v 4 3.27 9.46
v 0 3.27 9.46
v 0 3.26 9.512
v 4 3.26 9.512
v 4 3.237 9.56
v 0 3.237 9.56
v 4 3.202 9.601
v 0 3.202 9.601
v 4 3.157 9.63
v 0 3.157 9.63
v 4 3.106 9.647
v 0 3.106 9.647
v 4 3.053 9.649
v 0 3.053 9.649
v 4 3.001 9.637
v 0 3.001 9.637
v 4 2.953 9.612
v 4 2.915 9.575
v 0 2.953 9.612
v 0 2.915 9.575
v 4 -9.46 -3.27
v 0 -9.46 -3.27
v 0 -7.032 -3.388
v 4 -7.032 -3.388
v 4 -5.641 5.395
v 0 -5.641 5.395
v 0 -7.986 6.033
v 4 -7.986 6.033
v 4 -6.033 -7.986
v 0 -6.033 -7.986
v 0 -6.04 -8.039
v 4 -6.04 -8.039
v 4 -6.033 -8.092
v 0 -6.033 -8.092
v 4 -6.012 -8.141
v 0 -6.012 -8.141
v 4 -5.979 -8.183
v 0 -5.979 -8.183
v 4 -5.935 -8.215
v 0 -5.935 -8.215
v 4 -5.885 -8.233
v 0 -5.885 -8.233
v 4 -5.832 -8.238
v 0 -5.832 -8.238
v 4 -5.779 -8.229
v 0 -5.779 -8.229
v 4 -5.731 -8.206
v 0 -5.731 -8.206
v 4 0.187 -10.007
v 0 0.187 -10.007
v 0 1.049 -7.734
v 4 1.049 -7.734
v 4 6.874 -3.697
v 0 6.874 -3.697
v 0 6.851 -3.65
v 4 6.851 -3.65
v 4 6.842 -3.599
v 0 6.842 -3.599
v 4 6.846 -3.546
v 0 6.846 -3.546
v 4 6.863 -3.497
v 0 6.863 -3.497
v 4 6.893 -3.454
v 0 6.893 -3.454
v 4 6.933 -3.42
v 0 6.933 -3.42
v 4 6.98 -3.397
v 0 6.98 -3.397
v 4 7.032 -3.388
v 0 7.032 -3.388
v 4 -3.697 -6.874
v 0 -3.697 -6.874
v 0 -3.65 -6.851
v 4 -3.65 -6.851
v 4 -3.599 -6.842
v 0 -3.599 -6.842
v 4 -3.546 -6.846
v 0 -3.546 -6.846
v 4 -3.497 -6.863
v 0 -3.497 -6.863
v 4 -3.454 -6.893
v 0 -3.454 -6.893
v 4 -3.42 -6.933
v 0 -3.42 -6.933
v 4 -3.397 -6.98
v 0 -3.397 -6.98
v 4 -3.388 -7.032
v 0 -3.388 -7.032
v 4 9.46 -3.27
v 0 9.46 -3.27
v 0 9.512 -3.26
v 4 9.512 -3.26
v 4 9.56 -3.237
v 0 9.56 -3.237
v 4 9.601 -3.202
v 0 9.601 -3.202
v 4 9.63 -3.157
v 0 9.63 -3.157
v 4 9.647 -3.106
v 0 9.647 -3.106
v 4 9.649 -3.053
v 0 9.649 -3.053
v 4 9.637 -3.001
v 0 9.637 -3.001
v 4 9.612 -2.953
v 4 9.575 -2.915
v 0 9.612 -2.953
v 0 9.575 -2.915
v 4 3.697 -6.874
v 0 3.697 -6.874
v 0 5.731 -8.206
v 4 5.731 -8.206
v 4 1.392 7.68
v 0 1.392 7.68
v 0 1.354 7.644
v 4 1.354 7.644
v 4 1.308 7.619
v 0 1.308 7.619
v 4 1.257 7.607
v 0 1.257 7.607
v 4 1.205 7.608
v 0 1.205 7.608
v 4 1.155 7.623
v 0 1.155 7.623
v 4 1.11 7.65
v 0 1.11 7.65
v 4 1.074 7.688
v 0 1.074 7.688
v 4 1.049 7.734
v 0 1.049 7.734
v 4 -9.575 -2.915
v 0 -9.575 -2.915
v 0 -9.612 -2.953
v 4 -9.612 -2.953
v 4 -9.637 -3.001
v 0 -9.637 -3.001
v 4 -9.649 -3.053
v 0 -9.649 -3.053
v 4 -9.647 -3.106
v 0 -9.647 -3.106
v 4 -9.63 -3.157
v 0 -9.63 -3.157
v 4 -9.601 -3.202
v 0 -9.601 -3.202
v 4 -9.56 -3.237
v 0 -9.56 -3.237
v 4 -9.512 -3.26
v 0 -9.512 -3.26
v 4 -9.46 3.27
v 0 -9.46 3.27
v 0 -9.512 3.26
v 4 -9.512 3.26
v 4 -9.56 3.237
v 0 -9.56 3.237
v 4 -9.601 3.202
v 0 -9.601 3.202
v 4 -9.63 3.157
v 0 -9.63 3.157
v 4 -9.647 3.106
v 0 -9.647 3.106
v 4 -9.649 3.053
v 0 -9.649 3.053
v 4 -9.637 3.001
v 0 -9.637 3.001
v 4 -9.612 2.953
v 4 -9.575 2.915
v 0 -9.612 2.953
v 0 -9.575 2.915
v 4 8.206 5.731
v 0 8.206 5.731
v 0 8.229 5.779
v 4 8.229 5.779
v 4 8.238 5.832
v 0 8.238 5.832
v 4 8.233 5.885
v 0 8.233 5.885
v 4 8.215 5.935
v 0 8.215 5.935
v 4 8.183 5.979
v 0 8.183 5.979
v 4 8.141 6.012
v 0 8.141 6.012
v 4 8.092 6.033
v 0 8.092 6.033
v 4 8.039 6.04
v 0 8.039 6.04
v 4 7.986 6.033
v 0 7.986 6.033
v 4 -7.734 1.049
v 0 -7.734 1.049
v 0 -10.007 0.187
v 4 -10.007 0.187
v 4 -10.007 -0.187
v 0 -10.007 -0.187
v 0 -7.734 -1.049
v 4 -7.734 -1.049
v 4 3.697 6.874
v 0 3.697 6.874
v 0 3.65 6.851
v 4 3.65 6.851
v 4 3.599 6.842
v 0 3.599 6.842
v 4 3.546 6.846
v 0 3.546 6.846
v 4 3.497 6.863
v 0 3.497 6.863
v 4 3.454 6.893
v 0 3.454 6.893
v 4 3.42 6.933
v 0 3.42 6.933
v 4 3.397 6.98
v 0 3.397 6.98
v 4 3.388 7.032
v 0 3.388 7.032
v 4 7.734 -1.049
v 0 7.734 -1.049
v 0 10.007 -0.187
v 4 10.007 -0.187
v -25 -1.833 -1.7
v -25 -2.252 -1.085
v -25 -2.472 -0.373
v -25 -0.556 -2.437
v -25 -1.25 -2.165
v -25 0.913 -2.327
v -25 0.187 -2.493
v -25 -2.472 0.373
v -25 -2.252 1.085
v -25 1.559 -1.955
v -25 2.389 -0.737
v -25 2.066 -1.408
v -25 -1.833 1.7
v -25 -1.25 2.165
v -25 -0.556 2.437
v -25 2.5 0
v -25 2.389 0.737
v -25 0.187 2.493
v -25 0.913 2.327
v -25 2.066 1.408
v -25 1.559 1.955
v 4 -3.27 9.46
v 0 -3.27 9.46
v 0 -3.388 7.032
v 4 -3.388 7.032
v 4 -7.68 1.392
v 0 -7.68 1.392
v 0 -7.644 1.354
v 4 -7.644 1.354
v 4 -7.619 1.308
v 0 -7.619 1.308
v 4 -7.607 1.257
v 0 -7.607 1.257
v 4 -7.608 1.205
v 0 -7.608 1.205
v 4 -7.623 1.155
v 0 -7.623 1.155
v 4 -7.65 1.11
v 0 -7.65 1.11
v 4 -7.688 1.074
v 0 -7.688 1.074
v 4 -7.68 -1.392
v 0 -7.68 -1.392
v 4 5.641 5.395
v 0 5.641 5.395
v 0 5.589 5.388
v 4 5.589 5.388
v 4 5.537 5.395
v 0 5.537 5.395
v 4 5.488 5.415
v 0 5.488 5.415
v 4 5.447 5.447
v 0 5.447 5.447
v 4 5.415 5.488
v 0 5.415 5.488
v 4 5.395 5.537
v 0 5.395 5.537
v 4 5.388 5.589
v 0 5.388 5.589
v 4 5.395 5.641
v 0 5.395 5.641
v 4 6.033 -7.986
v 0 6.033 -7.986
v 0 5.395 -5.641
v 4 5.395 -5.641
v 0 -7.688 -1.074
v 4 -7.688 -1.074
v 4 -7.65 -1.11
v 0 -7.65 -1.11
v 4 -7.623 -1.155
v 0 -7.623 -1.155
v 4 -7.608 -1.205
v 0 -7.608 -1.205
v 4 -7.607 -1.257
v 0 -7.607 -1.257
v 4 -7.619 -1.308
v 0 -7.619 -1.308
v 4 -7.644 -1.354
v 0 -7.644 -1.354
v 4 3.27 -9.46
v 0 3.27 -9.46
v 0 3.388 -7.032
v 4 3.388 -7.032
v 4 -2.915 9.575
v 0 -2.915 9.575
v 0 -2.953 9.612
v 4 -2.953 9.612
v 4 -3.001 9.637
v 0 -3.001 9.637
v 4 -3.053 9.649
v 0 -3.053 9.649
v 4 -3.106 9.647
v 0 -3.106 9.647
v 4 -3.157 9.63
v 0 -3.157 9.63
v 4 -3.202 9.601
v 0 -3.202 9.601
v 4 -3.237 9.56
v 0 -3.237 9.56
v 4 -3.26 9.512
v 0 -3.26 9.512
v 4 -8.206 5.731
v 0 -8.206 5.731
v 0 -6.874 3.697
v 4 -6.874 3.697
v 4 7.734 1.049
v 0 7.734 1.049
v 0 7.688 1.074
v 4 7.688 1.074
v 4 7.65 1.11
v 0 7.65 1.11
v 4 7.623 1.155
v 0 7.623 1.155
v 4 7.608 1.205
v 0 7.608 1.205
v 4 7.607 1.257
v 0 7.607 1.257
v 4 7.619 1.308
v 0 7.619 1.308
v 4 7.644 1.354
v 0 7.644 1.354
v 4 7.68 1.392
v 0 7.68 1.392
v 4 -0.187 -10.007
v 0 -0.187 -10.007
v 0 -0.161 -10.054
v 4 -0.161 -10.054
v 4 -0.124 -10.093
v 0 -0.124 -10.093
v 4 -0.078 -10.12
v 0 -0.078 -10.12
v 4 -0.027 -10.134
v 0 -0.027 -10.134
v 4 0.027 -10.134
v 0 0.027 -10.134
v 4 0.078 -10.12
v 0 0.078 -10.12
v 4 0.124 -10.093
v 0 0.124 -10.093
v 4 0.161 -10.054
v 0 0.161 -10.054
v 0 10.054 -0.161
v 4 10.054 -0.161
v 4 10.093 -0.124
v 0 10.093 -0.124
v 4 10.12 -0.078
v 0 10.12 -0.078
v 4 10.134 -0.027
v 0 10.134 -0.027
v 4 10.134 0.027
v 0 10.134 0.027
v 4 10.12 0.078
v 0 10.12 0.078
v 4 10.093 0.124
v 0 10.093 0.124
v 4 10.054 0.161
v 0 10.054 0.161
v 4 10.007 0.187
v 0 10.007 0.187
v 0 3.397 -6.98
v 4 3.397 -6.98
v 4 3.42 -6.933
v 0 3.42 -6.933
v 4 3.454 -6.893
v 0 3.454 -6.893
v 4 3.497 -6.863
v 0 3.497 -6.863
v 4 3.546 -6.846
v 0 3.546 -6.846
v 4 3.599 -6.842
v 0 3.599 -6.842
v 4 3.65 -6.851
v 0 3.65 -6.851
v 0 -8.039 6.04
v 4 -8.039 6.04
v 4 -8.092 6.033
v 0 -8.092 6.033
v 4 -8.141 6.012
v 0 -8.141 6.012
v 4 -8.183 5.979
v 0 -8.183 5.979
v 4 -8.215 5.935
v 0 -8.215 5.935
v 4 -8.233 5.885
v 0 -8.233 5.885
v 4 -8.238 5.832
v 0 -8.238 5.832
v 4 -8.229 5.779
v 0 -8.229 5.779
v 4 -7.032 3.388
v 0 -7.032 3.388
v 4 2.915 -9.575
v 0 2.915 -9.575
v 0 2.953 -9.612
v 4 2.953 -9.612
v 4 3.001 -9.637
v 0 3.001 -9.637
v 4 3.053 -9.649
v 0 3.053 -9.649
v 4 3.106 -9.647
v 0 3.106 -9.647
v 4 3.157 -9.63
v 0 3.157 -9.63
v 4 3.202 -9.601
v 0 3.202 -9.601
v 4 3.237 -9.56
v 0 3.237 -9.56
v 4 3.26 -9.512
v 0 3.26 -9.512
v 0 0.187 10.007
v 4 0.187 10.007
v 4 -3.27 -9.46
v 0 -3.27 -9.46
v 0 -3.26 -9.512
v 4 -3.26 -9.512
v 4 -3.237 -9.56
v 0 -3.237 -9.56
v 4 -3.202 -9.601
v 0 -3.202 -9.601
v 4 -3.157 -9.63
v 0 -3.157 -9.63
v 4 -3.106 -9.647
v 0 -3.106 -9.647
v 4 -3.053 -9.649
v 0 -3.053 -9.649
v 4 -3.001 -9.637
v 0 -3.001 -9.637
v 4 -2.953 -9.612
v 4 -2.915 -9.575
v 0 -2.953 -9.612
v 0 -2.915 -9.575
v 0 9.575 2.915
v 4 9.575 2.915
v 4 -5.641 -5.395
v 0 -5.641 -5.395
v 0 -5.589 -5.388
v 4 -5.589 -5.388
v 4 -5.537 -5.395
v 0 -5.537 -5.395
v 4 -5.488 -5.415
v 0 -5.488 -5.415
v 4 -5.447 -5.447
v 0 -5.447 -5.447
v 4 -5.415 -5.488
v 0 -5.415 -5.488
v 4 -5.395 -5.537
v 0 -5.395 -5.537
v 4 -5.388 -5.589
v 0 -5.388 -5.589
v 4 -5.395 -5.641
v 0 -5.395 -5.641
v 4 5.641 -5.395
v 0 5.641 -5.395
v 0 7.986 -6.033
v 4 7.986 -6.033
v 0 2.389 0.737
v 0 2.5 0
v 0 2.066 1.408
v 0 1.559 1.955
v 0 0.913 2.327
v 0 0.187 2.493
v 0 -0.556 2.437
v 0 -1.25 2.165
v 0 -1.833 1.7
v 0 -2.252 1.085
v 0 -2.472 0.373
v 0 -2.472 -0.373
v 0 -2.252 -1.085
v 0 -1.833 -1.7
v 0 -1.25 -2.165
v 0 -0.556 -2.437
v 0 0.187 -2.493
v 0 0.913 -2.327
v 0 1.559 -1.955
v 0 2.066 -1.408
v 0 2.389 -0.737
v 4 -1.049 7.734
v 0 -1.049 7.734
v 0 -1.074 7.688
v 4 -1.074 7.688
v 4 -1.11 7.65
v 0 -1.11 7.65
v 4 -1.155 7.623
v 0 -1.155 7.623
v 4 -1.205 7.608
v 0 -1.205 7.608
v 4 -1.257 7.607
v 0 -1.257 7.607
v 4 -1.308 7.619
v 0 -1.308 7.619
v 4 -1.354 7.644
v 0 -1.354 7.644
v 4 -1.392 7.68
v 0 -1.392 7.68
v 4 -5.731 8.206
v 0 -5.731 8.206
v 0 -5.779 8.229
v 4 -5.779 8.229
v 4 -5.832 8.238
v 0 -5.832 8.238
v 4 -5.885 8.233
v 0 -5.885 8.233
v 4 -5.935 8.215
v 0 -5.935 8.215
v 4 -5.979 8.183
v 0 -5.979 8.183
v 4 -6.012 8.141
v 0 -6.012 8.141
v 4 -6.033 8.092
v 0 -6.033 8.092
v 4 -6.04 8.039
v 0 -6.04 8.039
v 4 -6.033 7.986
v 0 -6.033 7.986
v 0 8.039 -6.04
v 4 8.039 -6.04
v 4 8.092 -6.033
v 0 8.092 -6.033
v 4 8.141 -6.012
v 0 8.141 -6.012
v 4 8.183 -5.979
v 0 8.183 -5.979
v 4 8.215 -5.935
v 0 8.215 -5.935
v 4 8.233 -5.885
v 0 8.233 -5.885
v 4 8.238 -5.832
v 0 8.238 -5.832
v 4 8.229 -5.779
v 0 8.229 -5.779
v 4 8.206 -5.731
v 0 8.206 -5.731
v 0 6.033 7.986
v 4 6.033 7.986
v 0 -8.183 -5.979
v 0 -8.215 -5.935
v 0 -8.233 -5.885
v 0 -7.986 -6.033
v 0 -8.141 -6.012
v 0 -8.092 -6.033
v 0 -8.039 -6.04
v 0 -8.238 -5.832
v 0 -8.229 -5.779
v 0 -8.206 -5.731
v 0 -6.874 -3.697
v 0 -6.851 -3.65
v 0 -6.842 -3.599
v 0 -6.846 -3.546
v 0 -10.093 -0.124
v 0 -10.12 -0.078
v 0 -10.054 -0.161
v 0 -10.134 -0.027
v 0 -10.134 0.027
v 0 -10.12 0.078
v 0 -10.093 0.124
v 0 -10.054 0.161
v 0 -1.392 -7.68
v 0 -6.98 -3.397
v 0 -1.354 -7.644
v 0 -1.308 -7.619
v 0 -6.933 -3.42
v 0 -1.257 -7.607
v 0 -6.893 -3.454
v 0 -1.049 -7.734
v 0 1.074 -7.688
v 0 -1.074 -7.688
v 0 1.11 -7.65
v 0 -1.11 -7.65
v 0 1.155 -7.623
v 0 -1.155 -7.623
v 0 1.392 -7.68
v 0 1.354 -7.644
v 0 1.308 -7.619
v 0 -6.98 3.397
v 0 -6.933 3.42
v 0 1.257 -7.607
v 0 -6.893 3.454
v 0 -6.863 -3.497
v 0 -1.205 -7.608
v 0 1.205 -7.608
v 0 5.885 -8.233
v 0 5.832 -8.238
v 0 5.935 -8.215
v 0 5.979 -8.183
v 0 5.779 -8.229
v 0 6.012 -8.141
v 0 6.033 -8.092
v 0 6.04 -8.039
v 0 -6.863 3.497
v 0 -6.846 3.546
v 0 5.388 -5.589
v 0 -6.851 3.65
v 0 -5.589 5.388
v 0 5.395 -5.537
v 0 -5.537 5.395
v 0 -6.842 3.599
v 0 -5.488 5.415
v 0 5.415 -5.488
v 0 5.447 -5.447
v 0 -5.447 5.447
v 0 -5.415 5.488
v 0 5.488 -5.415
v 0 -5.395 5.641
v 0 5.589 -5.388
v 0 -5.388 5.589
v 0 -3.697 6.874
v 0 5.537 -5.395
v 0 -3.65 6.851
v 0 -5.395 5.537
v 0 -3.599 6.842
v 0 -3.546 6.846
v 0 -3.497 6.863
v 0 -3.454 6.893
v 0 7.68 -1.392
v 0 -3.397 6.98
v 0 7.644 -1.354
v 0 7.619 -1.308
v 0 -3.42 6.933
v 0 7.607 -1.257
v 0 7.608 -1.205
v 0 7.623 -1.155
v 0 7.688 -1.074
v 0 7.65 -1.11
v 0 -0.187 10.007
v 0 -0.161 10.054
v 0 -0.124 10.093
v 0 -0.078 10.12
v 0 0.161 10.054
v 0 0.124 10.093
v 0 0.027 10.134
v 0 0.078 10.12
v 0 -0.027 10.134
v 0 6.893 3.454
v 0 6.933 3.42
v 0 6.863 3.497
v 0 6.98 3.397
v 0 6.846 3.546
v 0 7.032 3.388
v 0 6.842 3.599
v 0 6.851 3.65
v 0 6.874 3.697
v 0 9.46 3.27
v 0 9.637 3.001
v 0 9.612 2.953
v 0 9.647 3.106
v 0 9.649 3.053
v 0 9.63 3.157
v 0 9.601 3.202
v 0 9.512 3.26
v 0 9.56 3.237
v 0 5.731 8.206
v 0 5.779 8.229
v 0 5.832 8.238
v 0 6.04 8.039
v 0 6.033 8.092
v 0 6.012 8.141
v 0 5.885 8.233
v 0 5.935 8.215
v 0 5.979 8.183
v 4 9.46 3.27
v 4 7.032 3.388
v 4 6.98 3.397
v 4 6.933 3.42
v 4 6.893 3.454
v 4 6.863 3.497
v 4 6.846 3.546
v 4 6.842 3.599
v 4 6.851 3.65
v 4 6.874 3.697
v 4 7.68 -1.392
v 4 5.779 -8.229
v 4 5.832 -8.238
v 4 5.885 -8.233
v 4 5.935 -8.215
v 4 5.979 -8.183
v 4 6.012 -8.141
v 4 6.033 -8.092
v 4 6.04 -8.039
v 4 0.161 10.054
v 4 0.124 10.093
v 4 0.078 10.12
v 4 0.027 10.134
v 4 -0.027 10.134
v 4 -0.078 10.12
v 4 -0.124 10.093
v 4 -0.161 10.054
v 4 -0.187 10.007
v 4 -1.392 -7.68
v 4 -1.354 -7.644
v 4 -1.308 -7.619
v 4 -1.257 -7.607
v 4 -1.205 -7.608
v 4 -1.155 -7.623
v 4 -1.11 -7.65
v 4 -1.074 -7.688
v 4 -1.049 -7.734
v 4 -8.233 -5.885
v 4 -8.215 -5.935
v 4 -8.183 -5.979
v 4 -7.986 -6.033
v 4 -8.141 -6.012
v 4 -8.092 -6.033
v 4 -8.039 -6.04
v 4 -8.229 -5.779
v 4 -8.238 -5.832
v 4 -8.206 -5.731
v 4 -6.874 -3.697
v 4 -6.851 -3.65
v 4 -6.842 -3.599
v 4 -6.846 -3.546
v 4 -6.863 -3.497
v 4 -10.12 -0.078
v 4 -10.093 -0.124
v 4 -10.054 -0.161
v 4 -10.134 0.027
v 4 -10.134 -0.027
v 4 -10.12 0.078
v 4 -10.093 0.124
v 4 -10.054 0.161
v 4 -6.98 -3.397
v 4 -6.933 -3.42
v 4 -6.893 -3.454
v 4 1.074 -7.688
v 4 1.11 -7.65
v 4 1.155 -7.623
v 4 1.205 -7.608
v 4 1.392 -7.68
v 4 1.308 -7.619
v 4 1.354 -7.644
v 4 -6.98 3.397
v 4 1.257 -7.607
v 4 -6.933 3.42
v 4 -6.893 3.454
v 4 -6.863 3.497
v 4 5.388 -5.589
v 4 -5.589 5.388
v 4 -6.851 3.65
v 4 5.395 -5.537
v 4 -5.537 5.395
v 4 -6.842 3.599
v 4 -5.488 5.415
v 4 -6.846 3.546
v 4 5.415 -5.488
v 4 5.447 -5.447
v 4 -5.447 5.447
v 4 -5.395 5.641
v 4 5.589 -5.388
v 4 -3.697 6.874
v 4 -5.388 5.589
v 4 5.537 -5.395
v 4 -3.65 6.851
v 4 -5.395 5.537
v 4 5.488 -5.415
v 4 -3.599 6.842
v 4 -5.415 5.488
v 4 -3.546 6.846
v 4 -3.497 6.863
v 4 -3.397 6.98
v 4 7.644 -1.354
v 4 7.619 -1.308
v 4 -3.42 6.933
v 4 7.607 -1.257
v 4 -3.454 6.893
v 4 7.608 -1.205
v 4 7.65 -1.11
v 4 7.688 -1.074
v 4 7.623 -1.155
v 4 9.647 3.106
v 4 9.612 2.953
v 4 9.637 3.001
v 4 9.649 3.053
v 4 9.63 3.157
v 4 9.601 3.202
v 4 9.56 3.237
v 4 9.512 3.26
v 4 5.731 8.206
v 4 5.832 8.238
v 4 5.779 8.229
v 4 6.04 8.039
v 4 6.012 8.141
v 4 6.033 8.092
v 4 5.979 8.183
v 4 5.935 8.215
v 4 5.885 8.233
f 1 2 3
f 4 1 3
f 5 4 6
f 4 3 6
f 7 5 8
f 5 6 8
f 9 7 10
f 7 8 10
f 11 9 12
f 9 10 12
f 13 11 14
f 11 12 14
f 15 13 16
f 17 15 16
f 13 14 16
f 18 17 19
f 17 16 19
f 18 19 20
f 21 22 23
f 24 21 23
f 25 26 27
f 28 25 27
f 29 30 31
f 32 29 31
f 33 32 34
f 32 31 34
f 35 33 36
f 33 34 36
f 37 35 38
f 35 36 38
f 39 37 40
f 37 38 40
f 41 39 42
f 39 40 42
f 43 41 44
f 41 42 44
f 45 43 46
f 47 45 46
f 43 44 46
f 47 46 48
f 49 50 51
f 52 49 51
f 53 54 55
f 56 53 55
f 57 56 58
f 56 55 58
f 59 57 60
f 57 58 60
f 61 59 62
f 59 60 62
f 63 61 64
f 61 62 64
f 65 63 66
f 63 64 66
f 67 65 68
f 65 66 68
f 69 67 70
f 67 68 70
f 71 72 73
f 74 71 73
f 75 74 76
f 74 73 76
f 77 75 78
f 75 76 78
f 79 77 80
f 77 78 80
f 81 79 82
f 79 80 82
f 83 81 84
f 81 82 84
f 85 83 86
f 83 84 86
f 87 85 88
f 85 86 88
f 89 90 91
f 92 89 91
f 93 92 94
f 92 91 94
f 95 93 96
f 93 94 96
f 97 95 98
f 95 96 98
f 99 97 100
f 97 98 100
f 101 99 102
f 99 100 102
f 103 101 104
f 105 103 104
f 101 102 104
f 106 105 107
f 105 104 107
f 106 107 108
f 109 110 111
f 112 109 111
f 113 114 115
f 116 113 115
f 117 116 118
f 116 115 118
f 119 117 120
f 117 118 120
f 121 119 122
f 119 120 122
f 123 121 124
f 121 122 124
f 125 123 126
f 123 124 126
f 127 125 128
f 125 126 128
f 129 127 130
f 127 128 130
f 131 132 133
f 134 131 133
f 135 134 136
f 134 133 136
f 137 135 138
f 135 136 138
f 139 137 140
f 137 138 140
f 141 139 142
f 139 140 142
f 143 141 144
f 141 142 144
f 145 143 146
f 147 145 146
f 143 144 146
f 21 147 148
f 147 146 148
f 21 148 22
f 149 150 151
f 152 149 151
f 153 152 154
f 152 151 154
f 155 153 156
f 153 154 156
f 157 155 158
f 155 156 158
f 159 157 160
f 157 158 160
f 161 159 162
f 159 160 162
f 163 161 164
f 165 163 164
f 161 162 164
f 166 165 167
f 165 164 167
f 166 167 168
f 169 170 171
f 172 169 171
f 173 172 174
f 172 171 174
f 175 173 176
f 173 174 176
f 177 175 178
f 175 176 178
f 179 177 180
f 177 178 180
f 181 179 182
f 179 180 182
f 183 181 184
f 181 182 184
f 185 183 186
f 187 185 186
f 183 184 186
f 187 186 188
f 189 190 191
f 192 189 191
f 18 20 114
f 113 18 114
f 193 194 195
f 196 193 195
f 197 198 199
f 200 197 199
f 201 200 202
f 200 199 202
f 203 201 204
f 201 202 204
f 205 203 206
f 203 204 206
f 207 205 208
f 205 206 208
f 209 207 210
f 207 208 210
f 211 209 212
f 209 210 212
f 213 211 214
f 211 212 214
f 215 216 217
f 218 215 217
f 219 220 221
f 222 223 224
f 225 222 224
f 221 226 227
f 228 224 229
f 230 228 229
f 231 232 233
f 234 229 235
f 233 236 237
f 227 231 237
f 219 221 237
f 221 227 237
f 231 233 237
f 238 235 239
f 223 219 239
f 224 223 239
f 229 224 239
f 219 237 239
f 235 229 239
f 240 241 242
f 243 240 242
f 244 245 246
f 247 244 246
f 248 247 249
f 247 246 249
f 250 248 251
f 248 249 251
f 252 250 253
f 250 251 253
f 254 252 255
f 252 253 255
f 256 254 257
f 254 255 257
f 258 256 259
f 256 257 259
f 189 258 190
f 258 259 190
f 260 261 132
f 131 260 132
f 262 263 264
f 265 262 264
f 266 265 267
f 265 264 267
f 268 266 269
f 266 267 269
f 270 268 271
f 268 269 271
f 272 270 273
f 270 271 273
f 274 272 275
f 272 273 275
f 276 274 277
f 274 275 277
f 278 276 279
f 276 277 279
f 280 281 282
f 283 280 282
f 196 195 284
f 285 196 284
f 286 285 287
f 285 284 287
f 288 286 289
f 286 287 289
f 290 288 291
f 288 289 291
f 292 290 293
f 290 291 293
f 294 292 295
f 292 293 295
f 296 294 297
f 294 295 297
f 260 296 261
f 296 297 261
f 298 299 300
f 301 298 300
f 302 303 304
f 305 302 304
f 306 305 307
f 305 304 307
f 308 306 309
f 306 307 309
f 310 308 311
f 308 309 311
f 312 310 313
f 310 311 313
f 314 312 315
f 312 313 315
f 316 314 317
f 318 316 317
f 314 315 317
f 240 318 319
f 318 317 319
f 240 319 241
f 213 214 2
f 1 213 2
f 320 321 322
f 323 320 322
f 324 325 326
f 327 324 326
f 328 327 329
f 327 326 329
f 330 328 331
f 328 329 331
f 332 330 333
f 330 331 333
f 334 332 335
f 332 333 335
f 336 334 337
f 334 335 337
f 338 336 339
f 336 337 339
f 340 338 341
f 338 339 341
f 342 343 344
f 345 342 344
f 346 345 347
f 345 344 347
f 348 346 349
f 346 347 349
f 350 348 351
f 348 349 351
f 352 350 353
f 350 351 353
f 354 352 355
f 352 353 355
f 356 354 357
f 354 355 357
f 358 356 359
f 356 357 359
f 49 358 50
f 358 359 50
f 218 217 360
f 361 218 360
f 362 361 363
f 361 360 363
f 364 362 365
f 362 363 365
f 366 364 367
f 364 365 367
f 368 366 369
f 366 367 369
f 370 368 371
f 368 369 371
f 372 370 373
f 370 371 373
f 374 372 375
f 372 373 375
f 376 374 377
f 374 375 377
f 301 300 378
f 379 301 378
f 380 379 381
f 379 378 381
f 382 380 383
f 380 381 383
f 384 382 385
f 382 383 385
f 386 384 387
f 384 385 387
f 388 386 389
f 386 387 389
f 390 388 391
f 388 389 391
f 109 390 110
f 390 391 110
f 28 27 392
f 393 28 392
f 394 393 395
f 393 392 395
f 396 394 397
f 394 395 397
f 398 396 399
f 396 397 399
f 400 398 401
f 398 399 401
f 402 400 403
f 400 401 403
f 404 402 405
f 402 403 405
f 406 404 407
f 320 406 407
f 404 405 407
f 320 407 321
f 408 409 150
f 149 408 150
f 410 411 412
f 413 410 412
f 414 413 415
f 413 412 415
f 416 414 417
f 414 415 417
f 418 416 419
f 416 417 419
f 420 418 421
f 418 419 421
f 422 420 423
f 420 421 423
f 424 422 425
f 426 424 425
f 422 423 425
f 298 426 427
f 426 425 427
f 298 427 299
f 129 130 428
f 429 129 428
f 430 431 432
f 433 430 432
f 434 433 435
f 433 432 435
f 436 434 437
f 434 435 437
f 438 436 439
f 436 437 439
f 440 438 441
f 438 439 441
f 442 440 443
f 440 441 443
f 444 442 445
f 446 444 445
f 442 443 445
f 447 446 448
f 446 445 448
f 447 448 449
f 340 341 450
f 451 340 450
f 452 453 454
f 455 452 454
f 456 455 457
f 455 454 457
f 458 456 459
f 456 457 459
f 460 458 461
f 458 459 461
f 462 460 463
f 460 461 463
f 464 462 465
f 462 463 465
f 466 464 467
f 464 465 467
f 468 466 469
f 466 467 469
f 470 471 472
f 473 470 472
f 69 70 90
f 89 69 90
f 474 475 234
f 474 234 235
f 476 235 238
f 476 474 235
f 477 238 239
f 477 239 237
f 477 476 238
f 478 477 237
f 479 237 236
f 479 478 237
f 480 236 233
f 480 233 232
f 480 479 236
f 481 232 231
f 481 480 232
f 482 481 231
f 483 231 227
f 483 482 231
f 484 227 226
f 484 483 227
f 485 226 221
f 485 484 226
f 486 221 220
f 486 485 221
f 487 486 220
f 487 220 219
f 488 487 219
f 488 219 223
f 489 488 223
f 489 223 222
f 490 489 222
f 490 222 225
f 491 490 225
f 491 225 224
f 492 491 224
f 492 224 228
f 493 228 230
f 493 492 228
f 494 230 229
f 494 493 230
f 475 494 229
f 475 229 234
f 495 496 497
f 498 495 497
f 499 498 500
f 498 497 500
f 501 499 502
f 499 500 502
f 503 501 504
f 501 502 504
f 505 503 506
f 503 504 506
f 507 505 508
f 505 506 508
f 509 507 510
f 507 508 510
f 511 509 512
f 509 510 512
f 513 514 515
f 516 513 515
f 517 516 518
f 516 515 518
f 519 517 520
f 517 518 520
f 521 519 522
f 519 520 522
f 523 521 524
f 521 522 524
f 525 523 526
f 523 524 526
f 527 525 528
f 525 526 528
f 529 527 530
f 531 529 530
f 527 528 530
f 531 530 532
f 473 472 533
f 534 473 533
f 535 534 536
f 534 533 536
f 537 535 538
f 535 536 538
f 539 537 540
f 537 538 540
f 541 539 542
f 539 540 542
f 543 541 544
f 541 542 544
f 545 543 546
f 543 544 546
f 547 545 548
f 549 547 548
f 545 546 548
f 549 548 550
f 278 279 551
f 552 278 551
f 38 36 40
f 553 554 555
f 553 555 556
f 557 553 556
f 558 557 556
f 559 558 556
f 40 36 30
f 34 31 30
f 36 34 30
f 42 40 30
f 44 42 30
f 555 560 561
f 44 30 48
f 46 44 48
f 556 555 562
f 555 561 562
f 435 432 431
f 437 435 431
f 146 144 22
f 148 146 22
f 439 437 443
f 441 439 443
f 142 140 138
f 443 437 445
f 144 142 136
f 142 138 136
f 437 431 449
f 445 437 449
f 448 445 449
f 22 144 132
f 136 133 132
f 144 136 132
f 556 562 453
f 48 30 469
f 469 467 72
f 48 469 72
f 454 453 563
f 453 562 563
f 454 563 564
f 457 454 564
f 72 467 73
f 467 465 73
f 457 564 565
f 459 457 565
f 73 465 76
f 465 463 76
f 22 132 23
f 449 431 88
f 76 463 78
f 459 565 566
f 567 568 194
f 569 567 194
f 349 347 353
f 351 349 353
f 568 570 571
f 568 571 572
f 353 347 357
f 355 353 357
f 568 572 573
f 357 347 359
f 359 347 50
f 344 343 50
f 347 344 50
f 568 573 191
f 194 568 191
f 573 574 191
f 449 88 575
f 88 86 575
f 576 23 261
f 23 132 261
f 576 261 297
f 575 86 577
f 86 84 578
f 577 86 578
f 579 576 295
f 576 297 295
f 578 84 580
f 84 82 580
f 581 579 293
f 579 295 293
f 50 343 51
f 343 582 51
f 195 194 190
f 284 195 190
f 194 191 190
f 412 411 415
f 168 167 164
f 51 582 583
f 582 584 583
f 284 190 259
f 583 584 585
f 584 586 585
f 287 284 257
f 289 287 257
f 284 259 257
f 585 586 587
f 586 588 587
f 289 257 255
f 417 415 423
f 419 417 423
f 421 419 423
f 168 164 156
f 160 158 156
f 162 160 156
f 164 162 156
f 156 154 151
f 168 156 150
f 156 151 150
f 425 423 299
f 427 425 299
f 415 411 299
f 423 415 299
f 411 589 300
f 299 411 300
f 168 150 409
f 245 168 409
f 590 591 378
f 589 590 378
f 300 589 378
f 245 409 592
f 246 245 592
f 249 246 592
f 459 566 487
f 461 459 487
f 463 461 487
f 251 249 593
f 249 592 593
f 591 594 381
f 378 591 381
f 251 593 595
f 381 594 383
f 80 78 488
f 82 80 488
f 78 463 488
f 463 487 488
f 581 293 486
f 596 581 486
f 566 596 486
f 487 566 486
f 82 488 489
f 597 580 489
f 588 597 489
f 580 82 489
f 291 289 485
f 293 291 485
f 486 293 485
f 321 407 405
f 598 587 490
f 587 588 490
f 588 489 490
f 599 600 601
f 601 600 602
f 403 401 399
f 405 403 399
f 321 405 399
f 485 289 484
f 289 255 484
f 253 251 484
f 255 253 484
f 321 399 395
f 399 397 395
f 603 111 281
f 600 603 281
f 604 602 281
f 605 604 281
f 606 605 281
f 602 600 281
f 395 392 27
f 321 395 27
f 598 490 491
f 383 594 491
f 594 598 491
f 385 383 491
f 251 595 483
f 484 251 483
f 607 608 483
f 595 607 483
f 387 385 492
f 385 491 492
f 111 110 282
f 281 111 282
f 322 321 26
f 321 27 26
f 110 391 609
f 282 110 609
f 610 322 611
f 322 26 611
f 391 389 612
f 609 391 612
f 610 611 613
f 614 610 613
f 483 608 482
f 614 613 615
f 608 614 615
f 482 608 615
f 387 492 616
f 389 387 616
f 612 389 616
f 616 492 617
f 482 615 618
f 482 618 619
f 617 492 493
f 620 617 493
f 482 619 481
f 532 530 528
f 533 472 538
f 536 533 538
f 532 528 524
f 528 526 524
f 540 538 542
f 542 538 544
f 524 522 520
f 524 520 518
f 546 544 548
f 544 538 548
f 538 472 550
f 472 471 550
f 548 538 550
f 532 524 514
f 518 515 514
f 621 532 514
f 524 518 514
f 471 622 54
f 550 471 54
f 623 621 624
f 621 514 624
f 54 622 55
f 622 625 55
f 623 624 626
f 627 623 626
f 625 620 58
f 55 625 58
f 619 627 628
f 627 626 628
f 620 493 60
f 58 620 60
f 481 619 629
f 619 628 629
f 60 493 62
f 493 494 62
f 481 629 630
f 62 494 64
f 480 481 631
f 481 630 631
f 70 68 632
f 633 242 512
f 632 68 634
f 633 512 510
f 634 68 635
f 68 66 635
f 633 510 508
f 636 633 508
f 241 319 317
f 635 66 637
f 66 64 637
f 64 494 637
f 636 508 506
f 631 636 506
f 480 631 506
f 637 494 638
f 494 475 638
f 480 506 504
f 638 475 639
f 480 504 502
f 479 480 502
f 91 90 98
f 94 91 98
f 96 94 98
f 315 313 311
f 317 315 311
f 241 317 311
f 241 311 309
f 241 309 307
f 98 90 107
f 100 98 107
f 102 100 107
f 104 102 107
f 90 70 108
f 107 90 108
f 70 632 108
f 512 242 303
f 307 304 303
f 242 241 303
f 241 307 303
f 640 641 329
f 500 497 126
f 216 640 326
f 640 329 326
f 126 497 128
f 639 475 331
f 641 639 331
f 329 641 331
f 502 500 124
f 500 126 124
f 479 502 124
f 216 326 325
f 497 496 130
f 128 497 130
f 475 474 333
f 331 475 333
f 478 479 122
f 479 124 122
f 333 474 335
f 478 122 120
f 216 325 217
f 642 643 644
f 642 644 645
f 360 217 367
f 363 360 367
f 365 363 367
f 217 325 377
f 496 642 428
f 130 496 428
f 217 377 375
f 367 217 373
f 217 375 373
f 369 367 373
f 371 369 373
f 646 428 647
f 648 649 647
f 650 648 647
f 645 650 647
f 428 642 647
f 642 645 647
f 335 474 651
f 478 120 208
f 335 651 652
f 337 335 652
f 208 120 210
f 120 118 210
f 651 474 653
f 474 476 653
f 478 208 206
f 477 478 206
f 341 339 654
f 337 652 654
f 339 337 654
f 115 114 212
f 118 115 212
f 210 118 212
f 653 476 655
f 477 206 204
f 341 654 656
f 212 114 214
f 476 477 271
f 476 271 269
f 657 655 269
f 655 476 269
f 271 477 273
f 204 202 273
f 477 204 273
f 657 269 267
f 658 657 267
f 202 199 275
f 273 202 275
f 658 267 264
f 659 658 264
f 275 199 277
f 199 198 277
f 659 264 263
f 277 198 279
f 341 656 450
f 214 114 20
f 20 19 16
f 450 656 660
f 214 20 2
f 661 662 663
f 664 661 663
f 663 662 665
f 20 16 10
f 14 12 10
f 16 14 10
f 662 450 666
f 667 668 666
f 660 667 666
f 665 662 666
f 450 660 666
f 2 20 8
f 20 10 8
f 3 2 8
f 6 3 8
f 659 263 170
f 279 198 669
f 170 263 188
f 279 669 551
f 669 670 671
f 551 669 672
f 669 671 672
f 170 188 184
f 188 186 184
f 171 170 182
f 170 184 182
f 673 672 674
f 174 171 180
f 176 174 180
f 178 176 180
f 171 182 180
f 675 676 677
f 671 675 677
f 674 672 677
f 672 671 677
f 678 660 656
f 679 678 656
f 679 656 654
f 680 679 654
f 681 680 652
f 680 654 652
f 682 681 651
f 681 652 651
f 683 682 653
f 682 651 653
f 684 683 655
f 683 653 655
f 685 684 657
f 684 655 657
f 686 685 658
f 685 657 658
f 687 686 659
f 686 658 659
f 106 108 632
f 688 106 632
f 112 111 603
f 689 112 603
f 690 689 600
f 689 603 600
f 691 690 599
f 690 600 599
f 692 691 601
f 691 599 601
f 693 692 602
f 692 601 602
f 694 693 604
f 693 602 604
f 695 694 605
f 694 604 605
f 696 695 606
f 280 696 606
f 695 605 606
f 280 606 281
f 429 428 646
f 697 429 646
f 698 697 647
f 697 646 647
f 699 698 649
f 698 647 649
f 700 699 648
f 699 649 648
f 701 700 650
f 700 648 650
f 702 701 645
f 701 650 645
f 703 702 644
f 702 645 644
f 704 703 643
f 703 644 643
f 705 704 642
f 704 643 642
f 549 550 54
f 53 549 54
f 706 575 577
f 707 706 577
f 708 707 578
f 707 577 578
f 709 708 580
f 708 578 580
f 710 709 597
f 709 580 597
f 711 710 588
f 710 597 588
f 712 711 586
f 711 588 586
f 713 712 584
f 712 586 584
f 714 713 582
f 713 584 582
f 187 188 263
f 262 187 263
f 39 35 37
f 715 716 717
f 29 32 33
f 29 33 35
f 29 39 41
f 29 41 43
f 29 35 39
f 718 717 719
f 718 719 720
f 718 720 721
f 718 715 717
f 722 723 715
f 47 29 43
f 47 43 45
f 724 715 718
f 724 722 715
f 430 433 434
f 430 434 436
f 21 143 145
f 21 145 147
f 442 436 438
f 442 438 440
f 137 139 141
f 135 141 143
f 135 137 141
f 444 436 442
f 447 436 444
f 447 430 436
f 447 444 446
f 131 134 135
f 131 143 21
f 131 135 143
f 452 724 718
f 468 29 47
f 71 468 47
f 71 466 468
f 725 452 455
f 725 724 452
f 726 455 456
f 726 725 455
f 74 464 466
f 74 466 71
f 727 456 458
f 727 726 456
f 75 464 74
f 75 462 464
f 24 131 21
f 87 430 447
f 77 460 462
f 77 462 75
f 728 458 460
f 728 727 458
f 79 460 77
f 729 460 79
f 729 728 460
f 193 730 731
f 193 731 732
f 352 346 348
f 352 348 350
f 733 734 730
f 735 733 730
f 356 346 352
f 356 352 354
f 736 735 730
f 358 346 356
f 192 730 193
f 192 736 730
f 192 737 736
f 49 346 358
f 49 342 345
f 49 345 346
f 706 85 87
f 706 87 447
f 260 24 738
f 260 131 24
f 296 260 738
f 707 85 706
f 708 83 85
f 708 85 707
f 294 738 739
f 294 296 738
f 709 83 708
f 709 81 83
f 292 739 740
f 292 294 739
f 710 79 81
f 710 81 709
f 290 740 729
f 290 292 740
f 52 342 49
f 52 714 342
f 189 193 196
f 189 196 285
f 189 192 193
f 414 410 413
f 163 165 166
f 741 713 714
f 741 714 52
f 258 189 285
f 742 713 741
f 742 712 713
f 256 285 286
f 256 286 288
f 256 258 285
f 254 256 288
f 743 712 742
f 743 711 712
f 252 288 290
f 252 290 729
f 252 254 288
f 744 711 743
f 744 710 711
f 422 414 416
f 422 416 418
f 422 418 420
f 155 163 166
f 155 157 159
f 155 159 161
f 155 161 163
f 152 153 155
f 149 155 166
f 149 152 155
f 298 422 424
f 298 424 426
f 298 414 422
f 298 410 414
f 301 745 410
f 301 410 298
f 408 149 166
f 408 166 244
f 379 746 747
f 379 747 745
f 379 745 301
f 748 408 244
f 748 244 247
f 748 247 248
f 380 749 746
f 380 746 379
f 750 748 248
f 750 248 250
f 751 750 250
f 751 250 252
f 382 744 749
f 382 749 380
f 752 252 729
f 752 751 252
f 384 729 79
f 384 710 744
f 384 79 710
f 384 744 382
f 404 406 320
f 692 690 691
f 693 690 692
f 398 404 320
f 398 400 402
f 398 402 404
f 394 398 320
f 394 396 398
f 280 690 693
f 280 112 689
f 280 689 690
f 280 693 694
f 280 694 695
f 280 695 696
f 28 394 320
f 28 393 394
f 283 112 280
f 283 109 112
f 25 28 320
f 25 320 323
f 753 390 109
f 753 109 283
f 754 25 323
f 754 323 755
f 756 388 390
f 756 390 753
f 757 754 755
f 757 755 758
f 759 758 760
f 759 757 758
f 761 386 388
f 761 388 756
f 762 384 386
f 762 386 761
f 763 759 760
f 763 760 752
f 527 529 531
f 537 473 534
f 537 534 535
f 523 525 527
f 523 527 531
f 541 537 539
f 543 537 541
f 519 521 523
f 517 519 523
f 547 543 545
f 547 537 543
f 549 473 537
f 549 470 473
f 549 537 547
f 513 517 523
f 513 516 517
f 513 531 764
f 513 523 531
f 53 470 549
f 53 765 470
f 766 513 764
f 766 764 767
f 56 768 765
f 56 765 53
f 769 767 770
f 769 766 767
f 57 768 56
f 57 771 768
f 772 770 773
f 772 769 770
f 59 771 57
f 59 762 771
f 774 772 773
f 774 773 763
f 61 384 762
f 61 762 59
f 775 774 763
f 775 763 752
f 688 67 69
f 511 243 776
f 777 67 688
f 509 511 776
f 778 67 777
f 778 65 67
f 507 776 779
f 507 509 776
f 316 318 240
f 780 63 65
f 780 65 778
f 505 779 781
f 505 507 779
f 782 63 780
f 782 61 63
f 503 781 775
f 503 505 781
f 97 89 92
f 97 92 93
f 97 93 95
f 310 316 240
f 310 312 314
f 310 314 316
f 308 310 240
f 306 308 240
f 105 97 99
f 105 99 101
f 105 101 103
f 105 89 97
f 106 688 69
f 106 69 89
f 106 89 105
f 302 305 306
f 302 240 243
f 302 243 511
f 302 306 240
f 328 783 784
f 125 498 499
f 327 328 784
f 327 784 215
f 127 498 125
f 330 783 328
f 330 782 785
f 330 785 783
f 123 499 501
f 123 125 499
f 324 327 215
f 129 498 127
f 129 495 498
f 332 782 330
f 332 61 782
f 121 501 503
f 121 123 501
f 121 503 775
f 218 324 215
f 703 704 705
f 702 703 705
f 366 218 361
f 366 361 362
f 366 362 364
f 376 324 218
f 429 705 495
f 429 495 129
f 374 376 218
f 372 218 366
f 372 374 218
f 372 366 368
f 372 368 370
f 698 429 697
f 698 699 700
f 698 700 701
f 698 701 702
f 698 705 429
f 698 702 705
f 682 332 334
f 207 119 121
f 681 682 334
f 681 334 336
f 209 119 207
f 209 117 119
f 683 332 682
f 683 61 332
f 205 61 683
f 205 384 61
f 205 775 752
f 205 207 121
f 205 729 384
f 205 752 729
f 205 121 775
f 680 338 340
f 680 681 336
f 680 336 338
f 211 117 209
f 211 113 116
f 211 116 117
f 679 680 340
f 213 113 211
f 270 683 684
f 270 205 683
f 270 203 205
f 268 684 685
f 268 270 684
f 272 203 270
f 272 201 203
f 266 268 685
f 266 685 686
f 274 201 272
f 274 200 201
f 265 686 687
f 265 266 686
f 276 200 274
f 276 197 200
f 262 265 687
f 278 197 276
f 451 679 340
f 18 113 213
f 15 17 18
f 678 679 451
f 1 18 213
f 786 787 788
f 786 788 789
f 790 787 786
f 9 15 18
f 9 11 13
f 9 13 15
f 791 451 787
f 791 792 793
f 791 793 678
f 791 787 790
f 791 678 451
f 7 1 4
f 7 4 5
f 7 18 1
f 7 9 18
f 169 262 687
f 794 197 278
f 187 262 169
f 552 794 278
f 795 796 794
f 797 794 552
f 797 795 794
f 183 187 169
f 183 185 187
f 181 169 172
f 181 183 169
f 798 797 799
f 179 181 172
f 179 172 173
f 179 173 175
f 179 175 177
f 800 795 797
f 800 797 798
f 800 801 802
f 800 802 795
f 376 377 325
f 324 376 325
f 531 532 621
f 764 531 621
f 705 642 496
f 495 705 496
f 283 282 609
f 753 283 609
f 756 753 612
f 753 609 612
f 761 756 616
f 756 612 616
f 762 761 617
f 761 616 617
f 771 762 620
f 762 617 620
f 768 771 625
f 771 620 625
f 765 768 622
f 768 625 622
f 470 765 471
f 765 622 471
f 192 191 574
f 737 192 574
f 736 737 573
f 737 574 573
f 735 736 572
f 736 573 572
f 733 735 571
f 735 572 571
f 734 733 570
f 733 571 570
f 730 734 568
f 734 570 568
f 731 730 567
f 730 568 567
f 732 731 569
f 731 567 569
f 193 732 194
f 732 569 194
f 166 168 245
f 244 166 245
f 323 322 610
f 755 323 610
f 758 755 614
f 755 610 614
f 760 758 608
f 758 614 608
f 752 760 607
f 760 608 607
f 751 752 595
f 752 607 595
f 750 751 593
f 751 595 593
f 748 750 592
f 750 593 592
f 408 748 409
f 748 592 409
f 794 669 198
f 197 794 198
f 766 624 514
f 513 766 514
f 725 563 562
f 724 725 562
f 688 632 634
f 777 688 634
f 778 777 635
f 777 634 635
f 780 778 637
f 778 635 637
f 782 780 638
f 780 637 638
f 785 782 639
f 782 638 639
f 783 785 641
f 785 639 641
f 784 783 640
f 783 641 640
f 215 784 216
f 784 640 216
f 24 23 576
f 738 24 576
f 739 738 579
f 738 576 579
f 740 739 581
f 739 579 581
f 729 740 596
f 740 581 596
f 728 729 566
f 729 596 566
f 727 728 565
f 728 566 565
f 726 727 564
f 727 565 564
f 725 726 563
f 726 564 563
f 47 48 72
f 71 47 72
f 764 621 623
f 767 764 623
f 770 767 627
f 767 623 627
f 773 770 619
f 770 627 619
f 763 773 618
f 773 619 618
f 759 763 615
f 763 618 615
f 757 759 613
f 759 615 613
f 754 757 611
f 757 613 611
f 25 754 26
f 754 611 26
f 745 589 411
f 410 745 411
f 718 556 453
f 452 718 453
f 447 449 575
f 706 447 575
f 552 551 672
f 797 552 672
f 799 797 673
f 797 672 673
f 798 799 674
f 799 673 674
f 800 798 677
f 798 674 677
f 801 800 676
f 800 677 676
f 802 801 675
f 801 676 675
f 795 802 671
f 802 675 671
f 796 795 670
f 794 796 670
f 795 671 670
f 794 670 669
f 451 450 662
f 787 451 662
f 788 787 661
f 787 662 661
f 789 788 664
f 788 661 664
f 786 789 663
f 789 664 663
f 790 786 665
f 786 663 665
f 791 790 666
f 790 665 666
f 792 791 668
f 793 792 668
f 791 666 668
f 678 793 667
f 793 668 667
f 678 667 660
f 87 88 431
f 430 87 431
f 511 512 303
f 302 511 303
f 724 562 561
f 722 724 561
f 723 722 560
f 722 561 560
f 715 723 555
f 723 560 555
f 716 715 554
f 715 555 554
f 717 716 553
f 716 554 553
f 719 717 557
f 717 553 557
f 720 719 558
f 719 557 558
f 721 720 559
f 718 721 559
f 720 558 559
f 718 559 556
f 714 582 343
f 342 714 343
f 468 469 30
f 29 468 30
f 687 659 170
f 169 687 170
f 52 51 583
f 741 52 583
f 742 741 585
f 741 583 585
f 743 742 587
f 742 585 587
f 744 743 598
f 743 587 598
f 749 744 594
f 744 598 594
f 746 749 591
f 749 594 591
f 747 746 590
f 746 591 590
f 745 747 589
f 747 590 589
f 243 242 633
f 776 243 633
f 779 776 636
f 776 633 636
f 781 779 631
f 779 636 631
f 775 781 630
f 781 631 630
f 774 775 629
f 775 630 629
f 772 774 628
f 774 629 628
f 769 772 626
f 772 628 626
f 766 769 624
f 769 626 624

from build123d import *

# Parameters (mm, degrees)
F1_DEPTH = 4
F2_R     = 2.5
F3_DEPTH = 25


with BuildPart() as f1:
    # F0 (on Right) → F1 (new body)
    with BuildSketch(Plane.YZ):
        with BuildLine():
            ThreePointArc((0.186993, 10.007145), (0, 10.136198), (-0.186993, 10.007145))
            Line((-0.186993, 10.007145), (-1.049264, 7.734473))
            ThreePointArc((-1.049264, 7.734473), (-1.20497, 7.607883), (-1.392175, 7.680162))
            Line((-1.392175, 7.680162), (-2.914536, 9.575144))
            ThreePointArc((-2.914536, 9.575144), (-3.132257, 9.640097), (-3.270219, 9.459576))
            Line((-3.270219, 9.459576), (-3.387993, 7.031681))
            ThreePointArc((-3.387993, 7.031681), (-3.49696, 6.86317), (-3.697337, 6.874062))
            Line((-3.697337, 6.874062), (-5.730771, 8.205862))
            ThreePointArc((-5.730771, 8.205862), (-5.957908, 8.200356), (-6.033333, 7.986038))
            Line((-6.033333, 7.986038), (-5.395082, 5.640579))
            ThreePointArc((-5.395082, 5.640579), (-5.446643, 5.446643), (-5.640579, 5.395082))
            Line((-5.640579, 5.395082), (-7.986038, 6.033333))
            ThreePointArc((-7.986038, 6.033333), (-8.200356, 5.957908), (-8.205862, 5.730771))
            Line((-8.205862, 5.730771), (-6.874062, 3.697337))
            ThreePointArc((-6.874062, 3.697337), (-6.86317, 3.49696), (-7.031681, 3.387993))
            Line((-7.031681, 3.387993), (-9.459576, 3.270219))
            ThreePointArc((-9.459576, 3.270219), (-9.640097, 3.132257), (-9.575144, 2.914536))
            Line((-9.575144, 2.914536), (-7.680162, 1.392175))
            ThreePointArc((-7.680162, 1.392175), (-7.607883, 1.20497), (-7.734473, 1.049264))
            Line((-7.734473, 1.049264), (-10.007145, 0.186993))
            ThreePointArc((-10.007145, 0.186993), (-10.136198, 0), (-10.007145, -0.186993))
            Line((-10.007145, -0.186993), (-7.734473, -1.049264))
            ThreePointArc((-7.734473, -1.049264), (-7.607883, -1.20497), (-7.680162, -1.392175))
            Line((-7.680162, -1.392175), (-9.575144, -2.914536))
            ThreePointArc((-9.575144, -2.914536), (-9.640097, -3.132257), (-9.459576, -3.270219))
            Line((-9.459576, -3.270219), (-7.031681, -3.387993))
            ThreePointArc((-7.031681, -3.387993), (-6.86317, -3.49696), (-6.874062, -3.697337))
            Line((-6.874062, -3.697337), (-8.205862, -5.730771))
            ThreePointArc((-8.205862, -5.730771), (-8.200356, -5.957908), (-7.986038, -6.033333))
            Line((-7.986038, -6.033333), (-5.640579, -5.395082))
            ThreePointArc((-5.640579, -5.395082), (-5.446643, -5.446643), (-5.395082, -5.640579))
            Line((-5.395082, -5.640579), (-6.033333, -7.986038))
            ThreePointArc((-6.033333, -7.986038), (-5.957908, -8.200356), (-5.730771, -8.205862))
            Line((-5.730771, -8.205862), (-3.697337, -6.874062))
            ThreePointArc((-3.697337, -6.874062), (-3.49696, -6.86317), (-3.387993, -7.031681))
            Line((-3.387993, -7.031681), (-3.270219, -9.459576))
            ThreePointArc((-3.270219, -9.459576), (-3.132257, -9.640097), (-2.914536, -9.575144))
            Line((-2.914536, -9.575144), (-1.392175, -7.680162))
            ThreePointArc((-1.392175, -7.680162), (-1.20497, -7.607883), (-1.049264, -7.734473))
            Line((-1.049264, -7.734473), (-0.186993, -10.007145))
            ThreePointArc((-0.186993, -10.007145), (0, -10.136198), (0.186993, -10.007145))
            Line((0.186993, -10.007145), (1.049264, -7.734473))
            ThreePointArc((1.049264, -7.734473), (1.20497, -7.607883), (1.392175, -7.680162))
            Line((1.392175, -7.680162), (2.914536, -9.575144))
            ThreePointArc((2.914536, -9.575144), (3.132257, -9.640097), (3.270219, -9.459576))
            Line((3.270219, -9.459576), (3.387993, -7.031681))
            ThreePointArc((3.387993, -7.031681), (3.49696, -6.86317), (3.697337, -6.874062))
            Line((3.697337, -6.874062), (5.730771, -8.205862))
            ThreePointArc((5.730771, -8.205862), (5.957908, -8.200356), (6.033333, -7.986038))
            Line((6.033333, -7.986038), (5.395082, -5.640579))
            ThreePointArc((5.395082, -5.640579), (5.446643, -5.446643), (5.640579, -5.395082))
            Line((5.640579, -5.395082), (7.986038, -6.033333))
            ThreePointArc((7.986038, -6.033333), (8.200356, -5.957908), (8.205862, -5.730771))
            Line((8.205862, -5.730771), (6.874062, -3.697337))
            ThreePointArc((6.874062, -3.697337), (6.86317, -3.49696), (7.031681, -3.387993))
            Line((7.031681, -3.387993), (9.459576, -3.270219))
            ThreePointArc((9.459576, -3.270219), (9.640097, -3.132257), (9.575144, -2.914536))
            Line((9.575144, -2.914536), (7.680162, -1.392175))
            ThreePointArc((7.680162, -1.392175), (7.607883, -1.20497), (7.734473, -1.049264))
            Line((7.734473, -1.049264), (10.007145, -0.186993))
            ThreePointArc((10.007145, -0.186993), (10.136198, 0), (10.007145, 0.186993))
            Line((10.007145, 0.186993), (7.734473, 1.049264))
            ThreePointArc((7.734473, 1.049264), (7.607883, 1.20497), (7.680162, 1.392175))
            Line((7.680162, 1.392175), (9.575144, 2.914536))
            ThreePointArc((9.575144, 2.914536), (9.640097, 3.132257), (9.459576, 3.270219))
            Line((9.459576, 3.270219), (7.031681, 3.387993))
            ThreePointArc((7.031681, 3.387993), (6.86317, 3.49696), (6.874062, 3.697337))
            Line((6.874062, 3.697337), (8.205862, 5.730771))
            ThreePointArc((8.205862, 5.730771), (8.200356, 5.957908), (7.986038, 6.033333))
            Line((7.986038, 6.033333), (5.640579, 5.395082))
            ThreePointArc((5.640579, 5.395082), (5.446643, 5.446643), (5.395082, 5.640579))
            Line((5.395082, 5.640579), (6.033333, 7.986038))
            ThreePointArc((6.033333, 7.986038), (5.957908, 8.200356), (5.730771, 8.205862))
            Line((5.730771, 8.205862), (3.697337, 6.874062))
            ThreePointArc((3.697337, 6.874062), (3.49696, 6.86317), (3.387993, 7.031681))
            Line((3.387993, 7.031681), (3.270219, 9.459576))
            ThreePointArc((3.270219, 9.459576), (3.132257, 9.640097), (2.914536, 9.575144))
            Line((2.914536, 9.575144), (1.392175, 7.680162))
            ThreePointArc((1.392175, 7.680162), (1.20497, 7.607883), (1.049264, 7.734473))
            Line((1.049264, 7.734473), (0.186993, 10.007145))
        make_face()
    extrude(amount=F1_DEPTH)

    # F2 (on Right) → F3 (join)
    with BuildSketch(Plane.YZ):
        Circle(F2_R)
    extrude(amount=-F3_DEPTH)


solid = f1.part
